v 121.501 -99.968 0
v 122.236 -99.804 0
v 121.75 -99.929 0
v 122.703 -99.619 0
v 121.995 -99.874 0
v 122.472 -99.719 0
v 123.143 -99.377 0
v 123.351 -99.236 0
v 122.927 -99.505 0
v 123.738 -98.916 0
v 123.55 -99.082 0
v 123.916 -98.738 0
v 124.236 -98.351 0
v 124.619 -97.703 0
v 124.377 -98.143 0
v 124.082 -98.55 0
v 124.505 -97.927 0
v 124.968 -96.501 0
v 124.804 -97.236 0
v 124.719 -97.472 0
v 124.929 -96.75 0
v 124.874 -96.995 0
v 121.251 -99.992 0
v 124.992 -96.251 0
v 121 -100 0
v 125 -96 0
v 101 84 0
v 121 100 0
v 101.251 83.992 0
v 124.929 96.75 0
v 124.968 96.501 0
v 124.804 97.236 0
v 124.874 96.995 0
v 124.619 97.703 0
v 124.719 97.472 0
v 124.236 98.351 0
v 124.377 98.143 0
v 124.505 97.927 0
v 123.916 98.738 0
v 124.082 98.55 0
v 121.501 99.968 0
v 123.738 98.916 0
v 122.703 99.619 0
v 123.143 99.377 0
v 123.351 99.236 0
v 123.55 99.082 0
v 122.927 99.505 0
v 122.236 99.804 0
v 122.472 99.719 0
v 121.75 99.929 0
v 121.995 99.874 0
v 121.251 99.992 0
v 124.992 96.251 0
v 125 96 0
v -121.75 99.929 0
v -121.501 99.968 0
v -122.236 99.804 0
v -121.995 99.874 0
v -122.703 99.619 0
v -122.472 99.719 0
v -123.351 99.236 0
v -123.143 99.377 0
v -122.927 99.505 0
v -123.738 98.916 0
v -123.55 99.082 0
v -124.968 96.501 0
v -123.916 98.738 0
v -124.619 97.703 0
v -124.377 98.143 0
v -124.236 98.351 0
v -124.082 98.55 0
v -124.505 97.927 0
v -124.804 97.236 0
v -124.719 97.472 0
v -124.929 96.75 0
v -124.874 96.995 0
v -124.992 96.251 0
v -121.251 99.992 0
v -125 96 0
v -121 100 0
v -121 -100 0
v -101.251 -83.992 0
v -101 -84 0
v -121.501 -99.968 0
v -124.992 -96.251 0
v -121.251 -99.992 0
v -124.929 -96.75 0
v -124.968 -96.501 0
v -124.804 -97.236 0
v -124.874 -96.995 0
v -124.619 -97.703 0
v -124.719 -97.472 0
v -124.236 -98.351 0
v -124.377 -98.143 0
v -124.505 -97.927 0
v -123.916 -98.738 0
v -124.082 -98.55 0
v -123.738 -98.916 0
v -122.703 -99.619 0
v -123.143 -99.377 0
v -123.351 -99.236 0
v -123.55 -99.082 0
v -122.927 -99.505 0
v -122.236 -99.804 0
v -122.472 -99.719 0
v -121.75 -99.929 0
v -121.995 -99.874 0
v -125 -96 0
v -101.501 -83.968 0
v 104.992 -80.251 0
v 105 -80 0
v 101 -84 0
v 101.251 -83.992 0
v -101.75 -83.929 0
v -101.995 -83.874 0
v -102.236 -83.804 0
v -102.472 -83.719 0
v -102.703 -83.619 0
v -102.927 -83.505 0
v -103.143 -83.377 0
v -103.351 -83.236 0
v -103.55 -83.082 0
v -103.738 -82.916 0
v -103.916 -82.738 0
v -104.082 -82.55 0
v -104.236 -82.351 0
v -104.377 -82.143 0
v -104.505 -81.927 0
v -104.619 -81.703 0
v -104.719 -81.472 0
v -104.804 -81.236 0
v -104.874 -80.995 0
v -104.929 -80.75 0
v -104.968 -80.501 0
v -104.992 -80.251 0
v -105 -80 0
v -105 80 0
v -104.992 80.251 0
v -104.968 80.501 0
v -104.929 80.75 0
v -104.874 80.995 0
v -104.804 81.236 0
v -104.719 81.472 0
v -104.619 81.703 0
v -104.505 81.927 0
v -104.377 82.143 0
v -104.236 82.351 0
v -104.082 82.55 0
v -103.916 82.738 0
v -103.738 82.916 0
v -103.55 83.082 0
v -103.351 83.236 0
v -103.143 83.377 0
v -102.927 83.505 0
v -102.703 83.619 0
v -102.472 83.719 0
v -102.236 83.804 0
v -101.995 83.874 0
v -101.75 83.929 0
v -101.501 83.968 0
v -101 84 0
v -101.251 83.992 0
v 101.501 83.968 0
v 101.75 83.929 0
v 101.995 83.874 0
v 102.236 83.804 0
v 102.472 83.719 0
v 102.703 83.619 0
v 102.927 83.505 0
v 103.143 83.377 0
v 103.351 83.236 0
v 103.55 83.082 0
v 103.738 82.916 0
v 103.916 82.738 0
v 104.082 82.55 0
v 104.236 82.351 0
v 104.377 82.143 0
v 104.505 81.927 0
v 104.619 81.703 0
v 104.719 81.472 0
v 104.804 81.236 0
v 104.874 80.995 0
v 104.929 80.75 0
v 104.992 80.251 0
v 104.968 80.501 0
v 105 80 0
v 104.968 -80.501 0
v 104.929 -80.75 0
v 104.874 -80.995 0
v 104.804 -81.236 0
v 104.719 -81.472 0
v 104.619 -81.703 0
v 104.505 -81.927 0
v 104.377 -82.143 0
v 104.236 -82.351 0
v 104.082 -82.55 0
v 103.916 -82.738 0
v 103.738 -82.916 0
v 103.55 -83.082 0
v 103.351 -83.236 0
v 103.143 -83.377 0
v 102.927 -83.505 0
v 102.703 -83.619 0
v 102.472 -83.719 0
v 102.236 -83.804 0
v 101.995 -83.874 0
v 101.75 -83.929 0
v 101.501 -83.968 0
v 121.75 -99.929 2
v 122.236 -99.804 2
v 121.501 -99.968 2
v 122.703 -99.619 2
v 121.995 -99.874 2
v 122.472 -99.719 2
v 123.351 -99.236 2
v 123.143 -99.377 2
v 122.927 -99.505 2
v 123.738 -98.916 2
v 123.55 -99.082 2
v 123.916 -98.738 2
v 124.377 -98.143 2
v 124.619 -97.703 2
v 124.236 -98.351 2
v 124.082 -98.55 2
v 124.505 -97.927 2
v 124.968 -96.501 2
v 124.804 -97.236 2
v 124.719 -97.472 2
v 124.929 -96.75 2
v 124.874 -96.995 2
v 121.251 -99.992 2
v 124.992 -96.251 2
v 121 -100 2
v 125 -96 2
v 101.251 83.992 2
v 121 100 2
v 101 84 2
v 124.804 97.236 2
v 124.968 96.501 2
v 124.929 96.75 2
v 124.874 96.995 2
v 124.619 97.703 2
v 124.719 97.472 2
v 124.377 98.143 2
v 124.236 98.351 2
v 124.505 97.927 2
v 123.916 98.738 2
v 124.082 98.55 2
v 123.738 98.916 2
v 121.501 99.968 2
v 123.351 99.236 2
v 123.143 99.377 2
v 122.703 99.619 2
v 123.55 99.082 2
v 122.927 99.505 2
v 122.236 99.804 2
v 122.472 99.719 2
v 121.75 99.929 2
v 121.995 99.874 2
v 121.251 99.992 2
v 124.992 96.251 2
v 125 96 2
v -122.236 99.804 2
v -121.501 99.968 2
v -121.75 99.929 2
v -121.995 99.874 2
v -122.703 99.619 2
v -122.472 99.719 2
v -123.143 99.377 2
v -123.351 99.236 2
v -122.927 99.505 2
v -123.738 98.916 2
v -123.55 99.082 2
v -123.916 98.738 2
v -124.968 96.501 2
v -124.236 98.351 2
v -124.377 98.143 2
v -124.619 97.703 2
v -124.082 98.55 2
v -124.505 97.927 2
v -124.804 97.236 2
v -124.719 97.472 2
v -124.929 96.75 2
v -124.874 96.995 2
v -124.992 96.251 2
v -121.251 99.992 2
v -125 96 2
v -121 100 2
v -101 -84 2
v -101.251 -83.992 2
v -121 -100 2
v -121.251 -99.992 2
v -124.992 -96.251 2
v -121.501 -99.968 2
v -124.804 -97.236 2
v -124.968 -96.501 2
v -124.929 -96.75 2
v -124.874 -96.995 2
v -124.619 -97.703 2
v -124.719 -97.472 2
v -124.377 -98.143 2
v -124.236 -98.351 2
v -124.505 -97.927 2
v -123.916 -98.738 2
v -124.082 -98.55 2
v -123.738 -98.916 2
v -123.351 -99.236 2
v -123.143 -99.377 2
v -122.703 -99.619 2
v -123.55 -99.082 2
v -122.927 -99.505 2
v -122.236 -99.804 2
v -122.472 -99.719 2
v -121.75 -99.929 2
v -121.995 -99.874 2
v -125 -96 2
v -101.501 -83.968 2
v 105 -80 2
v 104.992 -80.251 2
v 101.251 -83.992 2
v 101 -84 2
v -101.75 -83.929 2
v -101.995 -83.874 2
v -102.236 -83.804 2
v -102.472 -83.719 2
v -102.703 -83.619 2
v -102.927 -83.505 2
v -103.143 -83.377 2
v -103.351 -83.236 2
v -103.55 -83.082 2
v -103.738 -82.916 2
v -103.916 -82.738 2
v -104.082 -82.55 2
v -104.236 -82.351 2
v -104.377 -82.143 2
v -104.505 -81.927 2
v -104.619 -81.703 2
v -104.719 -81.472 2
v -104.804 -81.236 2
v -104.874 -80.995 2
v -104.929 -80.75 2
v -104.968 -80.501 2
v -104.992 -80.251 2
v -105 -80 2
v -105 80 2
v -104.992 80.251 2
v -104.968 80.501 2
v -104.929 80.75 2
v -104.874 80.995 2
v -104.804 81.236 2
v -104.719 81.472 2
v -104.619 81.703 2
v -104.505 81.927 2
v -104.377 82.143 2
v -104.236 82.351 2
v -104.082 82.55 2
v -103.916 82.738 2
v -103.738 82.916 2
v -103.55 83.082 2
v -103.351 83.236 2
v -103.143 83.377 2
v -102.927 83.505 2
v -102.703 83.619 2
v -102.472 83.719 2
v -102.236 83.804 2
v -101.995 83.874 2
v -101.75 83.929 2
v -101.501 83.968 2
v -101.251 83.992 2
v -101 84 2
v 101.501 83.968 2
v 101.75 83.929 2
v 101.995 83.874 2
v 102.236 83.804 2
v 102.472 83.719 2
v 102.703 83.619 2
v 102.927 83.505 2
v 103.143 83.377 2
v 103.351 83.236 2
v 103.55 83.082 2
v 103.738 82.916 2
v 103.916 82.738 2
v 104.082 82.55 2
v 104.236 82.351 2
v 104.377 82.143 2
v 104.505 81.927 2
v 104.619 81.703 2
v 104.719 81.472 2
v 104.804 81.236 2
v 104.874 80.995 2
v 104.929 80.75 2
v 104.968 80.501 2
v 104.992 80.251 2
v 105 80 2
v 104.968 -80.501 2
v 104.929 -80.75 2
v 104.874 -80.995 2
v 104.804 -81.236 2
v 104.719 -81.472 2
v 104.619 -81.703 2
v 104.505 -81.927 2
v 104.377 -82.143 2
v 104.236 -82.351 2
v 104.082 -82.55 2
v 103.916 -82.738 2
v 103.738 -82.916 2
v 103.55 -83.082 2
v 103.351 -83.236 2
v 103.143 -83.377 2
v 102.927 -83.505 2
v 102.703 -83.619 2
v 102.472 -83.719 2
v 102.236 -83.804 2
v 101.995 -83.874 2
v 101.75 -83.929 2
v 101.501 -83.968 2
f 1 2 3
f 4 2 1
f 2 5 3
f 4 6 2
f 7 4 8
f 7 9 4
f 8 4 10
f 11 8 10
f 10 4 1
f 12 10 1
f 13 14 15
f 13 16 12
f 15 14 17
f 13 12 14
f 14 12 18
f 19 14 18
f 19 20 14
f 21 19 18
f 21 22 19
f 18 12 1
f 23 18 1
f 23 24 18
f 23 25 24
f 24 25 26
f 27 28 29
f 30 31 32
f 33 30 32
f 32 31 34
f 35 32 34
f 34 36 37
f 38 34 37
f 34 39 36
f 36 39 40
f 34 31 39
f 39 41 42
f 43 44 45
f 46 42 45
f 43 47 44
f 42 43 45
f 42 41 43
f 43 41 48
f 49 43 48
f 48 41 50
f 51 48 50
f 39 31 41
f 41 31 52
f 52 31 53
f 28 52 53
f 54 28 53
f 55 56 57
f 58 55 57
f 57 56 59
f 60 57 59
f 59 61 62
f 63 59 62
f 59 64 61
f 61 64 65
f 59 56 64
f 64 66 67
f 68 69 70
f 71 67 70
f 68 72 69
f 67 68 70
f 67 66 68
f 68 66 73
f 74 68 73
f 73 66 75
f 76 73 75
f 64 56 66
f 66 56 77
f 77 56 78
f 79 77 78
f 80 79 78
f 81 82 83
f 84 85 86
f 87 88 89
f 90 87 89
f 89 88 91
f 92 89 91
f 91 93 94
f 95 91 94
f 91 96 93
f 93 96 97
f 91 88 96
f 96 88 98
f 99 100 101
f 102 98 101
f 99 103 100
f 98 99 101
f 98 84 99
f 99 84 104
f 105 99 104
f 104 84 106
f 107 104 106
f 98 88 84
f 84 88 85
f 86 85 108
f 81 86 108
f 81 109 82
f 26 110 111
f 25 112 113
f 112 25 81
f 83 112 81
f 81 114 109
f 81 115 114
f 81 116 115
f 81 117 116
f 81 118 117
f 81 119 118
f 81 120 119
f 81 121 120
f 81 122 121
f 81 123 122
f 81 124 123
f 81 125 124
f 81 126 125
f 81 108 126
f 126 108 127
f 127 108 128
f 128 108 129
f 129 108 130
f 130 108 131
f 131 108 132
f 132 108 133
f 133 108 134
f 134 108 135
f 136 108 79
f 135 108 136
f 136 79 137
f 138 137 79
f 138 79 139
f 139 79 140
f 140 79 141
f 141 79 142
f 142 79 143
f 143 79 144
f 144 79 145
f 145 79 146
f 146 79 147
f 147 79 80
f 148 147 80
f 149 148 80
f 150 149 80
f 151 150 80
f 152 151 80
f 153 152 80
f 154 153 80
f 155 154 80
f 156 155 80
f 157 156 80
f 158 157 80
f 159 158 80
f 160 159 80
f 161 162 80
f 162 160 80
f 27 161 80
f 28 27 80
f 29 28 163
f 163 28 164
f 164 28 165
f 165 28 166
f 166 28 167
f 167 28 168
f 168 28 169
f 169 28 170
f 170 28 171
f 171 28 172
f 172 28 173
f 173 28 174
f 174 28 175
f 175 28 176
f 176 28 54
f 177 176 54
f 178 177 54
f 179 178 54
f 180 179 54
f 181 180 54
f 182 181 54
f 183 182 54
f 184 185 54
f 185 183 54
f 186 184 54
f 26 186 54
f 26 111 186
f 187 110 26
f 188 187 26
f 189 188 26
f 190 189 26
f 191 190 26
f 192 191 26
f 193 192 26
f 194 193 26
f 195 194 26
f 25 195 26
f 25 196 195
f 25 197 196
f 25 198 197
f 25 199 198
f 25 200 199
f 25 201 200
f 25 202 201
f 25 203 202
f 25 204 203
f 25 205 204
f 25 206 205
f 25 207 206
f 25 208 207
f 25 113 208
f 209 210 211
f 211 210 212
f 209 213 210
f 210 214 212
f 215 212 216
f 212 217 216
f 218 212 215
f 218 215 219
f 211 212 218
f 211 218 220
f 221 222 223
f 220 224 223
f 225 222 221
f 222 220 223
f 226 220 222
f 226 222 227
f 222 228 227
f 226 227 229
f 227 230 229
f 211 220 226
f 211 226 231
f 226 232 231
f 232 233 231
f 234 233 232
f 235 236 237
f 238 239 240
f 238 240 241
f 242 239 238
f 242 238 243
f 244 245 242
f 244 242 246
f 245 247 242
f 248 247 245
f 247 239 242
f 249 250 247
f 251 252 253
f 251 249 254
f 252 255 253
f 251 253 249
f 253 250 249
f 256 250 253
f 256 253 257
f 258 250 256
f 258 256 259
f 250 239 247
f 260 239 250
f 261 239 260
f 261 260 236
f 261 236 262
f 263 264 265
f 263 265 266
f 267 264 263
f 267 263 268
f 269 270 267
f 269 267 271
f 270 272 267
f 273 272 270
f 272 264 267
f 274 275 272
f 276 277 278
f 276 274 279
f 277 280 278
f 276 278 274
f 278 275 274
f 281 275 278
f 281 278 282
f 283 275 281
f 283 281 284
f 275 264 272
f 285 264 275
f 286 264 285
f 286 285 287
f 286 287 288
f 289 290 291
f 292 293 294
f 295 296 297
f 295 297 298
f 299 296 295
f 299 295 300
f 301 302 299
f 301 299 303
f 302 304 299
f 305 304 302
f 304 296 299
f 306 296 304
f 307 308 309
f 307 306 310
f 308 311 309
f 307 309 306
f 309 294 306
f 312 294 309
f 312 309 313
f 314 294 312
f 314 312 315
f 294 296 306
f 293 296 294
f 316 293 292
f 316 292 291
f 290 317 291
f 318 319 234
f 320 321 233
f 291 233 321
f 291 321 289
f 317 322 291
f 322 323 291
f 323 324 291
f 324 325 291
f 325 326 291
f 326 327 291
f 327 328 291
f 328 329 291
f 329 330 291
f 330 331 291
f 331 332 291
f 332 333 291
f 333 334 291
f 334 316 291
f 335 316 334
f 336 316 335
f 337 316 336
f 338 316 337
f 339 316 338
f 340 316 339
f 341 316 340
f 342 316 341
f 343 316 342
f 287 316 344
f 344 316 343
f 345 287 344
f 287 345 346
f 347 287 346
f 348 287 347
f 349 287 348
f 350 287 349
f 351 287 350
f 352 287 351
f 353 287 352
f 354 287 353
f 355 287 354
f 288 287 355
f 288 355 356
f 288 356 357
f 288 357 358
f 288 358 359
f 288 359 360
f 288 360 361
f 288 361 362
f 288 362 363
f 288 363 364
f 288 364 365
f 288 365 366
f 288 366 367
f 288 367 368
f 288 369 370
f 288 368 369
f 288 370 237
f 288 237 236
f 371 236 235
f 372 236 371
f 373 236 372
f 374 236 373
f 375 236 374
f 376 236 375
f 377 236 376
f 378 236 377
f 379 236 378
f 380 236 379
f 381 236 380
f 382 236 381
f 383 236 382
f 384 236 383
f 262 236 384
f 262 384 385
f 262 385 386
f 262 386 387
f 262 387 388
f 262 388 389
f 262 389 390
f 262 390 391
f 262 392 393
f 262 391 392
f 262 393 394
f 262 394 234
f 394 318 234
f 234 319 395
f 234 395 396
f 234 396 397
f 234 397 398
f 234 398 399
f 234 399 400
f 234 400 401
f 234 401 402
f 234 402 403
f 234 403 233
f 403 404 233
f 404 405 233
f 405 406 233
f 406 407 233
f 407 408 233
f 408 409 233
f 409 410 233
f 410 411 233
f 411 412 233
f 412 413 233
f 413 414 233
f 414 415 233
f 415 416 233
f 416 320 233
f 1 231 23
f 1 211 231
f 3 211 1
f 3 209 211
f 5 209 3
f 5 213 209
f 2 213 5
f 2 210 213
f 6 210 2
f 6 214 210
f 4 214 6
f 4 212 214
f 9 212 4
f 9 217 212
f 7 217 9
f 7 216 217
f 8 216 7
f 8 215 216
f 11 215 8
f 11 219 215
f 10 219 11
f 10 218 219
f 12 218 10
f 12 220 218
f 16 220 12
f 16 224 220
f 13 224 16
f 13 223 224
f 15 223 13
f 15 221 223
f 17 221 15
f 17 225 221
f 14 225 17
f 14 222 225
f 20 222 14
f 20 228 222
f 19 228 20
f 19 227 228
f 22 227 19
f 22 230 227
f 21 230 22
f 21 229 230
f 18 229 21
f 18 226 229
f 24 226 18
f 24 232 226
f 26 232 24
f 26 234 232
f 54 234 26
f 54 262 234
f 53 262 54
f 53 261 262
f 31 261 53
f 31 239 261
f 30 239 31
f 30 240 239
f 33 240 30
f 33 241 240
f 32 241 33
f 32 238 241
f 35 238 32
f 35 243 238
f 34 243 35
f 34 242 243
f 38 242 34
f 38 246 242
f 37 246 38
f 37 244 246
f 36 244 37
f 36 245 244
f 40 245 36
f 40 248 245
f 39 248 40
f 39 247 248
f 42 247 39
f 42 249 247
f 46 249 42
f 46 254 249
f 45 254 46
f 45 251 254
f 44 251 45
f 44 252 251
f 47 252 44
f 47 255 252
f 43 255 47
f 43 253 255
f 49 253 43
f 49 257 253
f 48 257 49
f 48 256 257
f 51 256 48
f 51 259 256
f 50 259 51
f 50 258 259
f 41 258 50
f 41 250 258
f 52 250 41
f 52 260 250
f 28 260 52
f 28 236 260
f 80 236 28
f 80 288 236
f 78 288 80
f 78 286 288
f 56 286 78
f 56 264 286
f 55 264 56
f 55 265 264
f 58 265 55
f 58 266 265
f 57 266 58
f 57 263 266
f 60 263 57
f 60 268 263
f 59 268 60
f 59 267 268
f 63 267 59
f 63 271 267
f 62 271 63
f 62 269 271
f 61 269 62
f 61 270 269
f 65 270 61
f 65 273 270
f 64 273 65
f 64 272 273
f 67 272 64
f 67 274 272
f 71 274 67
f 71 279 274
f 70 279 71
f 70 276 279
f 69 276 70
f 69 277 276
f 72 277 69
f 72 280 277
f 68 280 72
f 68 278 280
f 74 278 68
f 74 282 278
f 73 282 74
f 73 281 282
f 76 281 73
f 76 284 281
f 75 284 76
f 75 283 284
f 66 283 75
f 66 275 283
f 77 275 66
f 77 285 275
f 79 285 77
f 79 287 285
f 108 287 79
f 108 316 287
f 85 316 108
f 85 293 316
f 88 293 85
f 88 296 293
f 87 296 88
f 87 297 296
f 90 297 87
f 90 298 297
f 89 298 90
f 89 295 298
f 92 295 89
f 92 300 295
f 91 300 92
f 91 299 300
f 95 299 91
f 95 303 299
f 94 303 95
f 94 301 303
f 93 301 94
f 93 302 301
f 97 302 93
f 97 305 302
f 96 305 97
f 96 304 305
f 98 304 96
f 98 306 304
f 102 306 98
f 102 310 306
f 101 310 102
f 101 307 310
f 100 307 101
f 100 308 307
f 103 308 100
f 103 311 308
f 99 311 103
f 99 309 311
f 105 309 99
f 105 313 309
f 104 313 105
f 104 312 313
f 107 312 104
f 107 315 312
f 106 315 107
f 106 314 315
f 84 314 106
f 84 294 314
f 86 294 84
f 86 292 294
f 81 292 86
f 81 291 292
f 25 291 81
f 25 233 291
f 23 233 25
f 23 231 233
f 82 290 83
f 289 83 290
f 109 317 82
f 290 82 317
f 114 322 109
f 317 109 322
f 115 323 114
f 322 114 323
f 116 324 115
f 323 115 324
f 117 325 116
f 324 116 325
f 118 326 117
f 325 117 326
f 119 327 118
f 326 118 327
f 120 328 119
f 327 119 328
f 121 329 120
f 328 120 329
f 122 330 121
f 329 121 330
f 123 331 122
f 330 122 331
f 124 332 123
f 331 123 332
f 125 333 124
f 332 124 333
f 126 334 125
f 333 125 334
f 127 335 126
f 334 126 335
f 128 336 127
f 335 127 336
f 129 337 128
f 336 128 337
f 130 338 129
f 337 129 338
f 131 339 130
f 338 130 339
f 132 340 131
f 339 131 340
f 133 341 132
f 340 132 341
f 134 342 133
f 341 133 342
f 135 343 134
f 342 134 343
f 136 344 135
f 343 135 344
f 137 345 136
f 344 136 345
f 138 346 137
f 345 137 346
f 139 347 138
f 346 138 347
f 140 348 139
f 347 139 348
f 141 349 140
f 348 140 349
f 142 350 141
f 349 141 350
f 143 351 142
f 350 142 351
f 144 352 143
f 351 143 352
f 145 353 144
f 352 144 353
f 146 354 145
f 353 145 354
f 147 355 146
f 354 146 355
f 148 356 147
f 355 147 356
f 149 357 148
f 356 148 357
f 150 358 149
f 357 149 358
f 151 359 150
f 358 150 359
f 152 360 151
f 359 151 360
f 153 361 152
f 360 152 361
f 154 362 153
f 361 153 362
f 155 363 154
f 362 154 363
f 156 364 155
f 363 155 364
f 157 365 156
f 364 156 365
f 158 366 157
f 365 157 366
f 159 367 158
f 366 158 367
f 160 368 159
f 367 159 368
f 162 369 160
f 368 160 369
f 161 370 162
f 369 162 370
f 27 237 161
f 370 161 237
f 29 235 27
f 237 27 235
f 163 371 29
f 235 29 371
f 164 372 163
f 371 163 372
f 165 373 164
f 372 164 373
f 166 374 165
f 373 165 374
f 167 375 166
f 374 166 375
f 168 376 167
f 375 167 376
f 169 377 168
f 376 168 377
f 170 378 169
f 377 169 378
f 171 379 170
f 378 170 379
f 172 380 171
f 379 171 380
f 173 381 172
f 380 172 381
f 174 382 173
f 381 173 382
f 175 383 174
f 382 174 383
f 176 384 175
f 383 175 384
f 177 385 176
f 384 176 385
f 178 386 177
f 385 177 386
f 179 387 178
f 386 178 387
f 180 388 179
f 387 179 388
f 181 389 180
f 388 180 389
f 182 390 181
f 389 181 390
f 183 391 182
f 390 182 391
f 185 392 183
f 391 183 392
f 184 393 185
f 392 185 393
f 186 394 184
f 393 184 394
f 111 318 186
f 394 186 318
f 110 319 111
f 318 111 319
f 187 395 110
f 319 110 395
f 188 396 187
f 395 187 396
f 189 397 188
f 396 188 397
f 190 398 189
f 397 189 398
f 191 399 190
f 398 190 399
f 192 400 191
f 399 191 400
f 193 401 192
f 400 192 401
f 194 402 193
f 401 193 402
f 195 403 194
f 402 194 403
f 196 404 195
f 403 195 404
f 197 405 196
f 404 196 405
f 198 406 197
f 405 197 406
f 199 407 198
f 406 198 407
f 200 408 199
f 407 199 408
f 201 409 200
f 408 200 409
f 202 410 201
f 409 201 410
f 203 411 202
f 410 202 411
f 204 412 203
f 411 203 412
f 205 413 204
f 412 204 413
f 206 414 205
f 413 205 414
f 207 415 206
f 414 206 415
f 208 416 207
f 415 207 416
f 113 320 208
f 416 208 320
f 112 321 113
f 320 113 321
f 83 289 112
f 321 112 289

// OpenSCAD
/*
Gridfinity Spacer Generator

by IOIO72 aka Tamio Patrick Honma (https://honma.de)


LICENSE

- The source code of the OpenSCAD files is licensed under the MIT license.
- The models generated by the source code are licensed under the Creative Commons Attribution-NonCommercial-ShareAlike 4.0 International License (CC BY-NC-SA 4.0).


DESCRIPTION

Create spacers to fit the [Gridfinity base](https://than.gs/m/60925) into drawers, containers and the like.
You can either print and assemble the spacers separately from the Gridfinity base or digitally merge the two in the slicer.

Note: Before considering this generator, you should first take a look at the [base plate generator](https://github.com/kennetek/gridfinity-rebuilt-openscad/blob/main/gridfinity-rebuilt-baseplate.scad) from the [Gridfinity Rebuilt in OpenSCAD](https://github.com/kennetek/gridfinity-rebuilt-openscad) project. There you can use the “Fit to Drawer” parameters to achieve similar results. The main **advantage of the Gridfinity Spacer Generator** is the ability to print the spacers separately from the base plate, which allows you to add the spacers later and reuse your existing baseplates if you rearrange your baseplates, e.g. to use them in a different drawer. In addition, the Gridfinity Spacer can be configured with a thinner thickness to save filament and print time.


Basic use

1. load the file *Gridfinity Spacer.scad* into [OpenSCAD](https://openscad.org/).
2. open the customizer in the menu *Window → Customizer*.
3. enter the number of segments for the width and length of your Gridfinity base plate.
4. enter the measured milimeter values of the available space.
5. create your spacer plate and print it.
   5.1. render the customized spacer plate via the key *F6* or menu *Design → Render*.
   5.2. export the render via the key F7 or menu *File → Export → Export STL*.


Advanced options

- Align the base plate on the spacer plate.
- Set alignment offsets to the edge of the spacer plate.
- Define the thickness of the spacer plate.
- Define the shape of the corners.


Tips

Tips for the generator:

- If you print the spacer plate separately and the gridfinity base plate does not fit into the spacer plate, use the “Spacer tolerance” option and increase its value.
- To test the tolerances, you can print a very thin version of the spacer plate by setting the “Spacer thickness” to one or two print layer heights (e.g. 0.2 mm).

Tips for the slicer:

- If the result is too large for your print bed, use your slicer to cut the model.
- Beforehand, you can merge the spacer plate with the Gridfinity base plate in the slicer.

Tips to achive this in BambuStudio:

- Merging spacers and gridfinity baseplate:
  - Select "File/Import/STL"
  - Select the spacer.stl and the baseplate.stl at once in the file dialog and import both files
  - Select "Yes" to confirm the merge of both files to one object.
- If the result is too large for your build plate, use the cut tool without using the mouse to edit the values. Rotate the cut plane by 90° degrees and perform the cut. If you have an odd number of gridfinity segments, move the cut plane by 21 milimeters.

*/


/* [Hidden] */

// Gridfinity base size in mm
gridfinity_size=42;

// Gridfinity base plate corner diameter
gridfinity_corner_diameter=8;


/* [Gridfinity Base Plate] */

// Number of width grid segments
grid_width=5;

// Number of length grid segments
grid_length=4;


/* [Space] */

// Measured width in mm to be filled
space_width=250;

// Measured length in mm to be filled
space_length=200;

// Spacer thickness in mm (base plate thicknesses: 4=default, 5=magnet, 9.8=weighted)
spacer_thickness=2; // [0.1:0.1:10]

// Rounded base plate corners
rounded_base_plate_corners=true;

// Rounded spacer plate corners
rounded_spacer_plate_corners=true;


/* [Advanced Spacer Options] */

// Width alignment of the grid
width_alignment="center"; // [left, center, right]

// Width offset in mm (when not centered)
width_offset=1;

// Length alignment of the grid
length_alignment="center"; // [front, center, back]

// Length offset in mm (when not centered)
length_offset=1;

// Spacer inner tollerance in mm
spacer_tolerance=0.0; // [0:0.1:2]

/* [Expert Options] */

// Fragments number
$fn=100; // [15:200]


/* [Hidden] */

spacer_plate_width=space_width - (rounded_spacer_plate_corners==true ? gridfinity_corner_diameter : 0);
spacer_plate_length=space_length - (rounded_spacer_plate_corners==true ? gridfinity_corner_diameter : 0);

grid_space_width=(grid_width * gridfinity_size) + (2 * spacer_tolerance) - (rounded_base_plate_corners==true ? gridfinity_corner_diameter : 0);
grid_space_length=(grid_length * gridfinity_size) + (2 * spacer_tolerance) - (rounded_base_plate_corners==true ? gridfinity_corner_diameter : 0);

shift_width_value=((space_width - grid_space_width - (rounded_base_plate_corners==true ? gridfinity_corner_diameter : 0)) / 2) - width_offset;
shift_length_value=((space_length - grid_space_length - (rounded_base_plate_corners==true ? gridfinity_corner_diameter : 0)) / 2) - length_offset;

shift_width=width_alignment=="left" ? shift_width_value * -1 : width_alignment=="right" ? shift_width_value : 0;
shift_length=length_alignment=="front" ? shift_length_value * -1 : length_alignment=="back" ? shift_length_value : 0;

linear_extrude(spacer_thickness) {
    difference() {
        minkowski() {
            if (rounded_spacer_plate_corners) circle(d=gridfinity_corner_diameter);
            square([spacer_plate_width, spacer_plate_length], true);
        }
        translate([shift_width, shift_length, 0]) {
            minkowski() {
                if (rounded_base_plate_corners) circle(d=gridfinity_corner_diameter);
                square([grid_space_width, grid_space_length], true);
            }
        }
    }
}
